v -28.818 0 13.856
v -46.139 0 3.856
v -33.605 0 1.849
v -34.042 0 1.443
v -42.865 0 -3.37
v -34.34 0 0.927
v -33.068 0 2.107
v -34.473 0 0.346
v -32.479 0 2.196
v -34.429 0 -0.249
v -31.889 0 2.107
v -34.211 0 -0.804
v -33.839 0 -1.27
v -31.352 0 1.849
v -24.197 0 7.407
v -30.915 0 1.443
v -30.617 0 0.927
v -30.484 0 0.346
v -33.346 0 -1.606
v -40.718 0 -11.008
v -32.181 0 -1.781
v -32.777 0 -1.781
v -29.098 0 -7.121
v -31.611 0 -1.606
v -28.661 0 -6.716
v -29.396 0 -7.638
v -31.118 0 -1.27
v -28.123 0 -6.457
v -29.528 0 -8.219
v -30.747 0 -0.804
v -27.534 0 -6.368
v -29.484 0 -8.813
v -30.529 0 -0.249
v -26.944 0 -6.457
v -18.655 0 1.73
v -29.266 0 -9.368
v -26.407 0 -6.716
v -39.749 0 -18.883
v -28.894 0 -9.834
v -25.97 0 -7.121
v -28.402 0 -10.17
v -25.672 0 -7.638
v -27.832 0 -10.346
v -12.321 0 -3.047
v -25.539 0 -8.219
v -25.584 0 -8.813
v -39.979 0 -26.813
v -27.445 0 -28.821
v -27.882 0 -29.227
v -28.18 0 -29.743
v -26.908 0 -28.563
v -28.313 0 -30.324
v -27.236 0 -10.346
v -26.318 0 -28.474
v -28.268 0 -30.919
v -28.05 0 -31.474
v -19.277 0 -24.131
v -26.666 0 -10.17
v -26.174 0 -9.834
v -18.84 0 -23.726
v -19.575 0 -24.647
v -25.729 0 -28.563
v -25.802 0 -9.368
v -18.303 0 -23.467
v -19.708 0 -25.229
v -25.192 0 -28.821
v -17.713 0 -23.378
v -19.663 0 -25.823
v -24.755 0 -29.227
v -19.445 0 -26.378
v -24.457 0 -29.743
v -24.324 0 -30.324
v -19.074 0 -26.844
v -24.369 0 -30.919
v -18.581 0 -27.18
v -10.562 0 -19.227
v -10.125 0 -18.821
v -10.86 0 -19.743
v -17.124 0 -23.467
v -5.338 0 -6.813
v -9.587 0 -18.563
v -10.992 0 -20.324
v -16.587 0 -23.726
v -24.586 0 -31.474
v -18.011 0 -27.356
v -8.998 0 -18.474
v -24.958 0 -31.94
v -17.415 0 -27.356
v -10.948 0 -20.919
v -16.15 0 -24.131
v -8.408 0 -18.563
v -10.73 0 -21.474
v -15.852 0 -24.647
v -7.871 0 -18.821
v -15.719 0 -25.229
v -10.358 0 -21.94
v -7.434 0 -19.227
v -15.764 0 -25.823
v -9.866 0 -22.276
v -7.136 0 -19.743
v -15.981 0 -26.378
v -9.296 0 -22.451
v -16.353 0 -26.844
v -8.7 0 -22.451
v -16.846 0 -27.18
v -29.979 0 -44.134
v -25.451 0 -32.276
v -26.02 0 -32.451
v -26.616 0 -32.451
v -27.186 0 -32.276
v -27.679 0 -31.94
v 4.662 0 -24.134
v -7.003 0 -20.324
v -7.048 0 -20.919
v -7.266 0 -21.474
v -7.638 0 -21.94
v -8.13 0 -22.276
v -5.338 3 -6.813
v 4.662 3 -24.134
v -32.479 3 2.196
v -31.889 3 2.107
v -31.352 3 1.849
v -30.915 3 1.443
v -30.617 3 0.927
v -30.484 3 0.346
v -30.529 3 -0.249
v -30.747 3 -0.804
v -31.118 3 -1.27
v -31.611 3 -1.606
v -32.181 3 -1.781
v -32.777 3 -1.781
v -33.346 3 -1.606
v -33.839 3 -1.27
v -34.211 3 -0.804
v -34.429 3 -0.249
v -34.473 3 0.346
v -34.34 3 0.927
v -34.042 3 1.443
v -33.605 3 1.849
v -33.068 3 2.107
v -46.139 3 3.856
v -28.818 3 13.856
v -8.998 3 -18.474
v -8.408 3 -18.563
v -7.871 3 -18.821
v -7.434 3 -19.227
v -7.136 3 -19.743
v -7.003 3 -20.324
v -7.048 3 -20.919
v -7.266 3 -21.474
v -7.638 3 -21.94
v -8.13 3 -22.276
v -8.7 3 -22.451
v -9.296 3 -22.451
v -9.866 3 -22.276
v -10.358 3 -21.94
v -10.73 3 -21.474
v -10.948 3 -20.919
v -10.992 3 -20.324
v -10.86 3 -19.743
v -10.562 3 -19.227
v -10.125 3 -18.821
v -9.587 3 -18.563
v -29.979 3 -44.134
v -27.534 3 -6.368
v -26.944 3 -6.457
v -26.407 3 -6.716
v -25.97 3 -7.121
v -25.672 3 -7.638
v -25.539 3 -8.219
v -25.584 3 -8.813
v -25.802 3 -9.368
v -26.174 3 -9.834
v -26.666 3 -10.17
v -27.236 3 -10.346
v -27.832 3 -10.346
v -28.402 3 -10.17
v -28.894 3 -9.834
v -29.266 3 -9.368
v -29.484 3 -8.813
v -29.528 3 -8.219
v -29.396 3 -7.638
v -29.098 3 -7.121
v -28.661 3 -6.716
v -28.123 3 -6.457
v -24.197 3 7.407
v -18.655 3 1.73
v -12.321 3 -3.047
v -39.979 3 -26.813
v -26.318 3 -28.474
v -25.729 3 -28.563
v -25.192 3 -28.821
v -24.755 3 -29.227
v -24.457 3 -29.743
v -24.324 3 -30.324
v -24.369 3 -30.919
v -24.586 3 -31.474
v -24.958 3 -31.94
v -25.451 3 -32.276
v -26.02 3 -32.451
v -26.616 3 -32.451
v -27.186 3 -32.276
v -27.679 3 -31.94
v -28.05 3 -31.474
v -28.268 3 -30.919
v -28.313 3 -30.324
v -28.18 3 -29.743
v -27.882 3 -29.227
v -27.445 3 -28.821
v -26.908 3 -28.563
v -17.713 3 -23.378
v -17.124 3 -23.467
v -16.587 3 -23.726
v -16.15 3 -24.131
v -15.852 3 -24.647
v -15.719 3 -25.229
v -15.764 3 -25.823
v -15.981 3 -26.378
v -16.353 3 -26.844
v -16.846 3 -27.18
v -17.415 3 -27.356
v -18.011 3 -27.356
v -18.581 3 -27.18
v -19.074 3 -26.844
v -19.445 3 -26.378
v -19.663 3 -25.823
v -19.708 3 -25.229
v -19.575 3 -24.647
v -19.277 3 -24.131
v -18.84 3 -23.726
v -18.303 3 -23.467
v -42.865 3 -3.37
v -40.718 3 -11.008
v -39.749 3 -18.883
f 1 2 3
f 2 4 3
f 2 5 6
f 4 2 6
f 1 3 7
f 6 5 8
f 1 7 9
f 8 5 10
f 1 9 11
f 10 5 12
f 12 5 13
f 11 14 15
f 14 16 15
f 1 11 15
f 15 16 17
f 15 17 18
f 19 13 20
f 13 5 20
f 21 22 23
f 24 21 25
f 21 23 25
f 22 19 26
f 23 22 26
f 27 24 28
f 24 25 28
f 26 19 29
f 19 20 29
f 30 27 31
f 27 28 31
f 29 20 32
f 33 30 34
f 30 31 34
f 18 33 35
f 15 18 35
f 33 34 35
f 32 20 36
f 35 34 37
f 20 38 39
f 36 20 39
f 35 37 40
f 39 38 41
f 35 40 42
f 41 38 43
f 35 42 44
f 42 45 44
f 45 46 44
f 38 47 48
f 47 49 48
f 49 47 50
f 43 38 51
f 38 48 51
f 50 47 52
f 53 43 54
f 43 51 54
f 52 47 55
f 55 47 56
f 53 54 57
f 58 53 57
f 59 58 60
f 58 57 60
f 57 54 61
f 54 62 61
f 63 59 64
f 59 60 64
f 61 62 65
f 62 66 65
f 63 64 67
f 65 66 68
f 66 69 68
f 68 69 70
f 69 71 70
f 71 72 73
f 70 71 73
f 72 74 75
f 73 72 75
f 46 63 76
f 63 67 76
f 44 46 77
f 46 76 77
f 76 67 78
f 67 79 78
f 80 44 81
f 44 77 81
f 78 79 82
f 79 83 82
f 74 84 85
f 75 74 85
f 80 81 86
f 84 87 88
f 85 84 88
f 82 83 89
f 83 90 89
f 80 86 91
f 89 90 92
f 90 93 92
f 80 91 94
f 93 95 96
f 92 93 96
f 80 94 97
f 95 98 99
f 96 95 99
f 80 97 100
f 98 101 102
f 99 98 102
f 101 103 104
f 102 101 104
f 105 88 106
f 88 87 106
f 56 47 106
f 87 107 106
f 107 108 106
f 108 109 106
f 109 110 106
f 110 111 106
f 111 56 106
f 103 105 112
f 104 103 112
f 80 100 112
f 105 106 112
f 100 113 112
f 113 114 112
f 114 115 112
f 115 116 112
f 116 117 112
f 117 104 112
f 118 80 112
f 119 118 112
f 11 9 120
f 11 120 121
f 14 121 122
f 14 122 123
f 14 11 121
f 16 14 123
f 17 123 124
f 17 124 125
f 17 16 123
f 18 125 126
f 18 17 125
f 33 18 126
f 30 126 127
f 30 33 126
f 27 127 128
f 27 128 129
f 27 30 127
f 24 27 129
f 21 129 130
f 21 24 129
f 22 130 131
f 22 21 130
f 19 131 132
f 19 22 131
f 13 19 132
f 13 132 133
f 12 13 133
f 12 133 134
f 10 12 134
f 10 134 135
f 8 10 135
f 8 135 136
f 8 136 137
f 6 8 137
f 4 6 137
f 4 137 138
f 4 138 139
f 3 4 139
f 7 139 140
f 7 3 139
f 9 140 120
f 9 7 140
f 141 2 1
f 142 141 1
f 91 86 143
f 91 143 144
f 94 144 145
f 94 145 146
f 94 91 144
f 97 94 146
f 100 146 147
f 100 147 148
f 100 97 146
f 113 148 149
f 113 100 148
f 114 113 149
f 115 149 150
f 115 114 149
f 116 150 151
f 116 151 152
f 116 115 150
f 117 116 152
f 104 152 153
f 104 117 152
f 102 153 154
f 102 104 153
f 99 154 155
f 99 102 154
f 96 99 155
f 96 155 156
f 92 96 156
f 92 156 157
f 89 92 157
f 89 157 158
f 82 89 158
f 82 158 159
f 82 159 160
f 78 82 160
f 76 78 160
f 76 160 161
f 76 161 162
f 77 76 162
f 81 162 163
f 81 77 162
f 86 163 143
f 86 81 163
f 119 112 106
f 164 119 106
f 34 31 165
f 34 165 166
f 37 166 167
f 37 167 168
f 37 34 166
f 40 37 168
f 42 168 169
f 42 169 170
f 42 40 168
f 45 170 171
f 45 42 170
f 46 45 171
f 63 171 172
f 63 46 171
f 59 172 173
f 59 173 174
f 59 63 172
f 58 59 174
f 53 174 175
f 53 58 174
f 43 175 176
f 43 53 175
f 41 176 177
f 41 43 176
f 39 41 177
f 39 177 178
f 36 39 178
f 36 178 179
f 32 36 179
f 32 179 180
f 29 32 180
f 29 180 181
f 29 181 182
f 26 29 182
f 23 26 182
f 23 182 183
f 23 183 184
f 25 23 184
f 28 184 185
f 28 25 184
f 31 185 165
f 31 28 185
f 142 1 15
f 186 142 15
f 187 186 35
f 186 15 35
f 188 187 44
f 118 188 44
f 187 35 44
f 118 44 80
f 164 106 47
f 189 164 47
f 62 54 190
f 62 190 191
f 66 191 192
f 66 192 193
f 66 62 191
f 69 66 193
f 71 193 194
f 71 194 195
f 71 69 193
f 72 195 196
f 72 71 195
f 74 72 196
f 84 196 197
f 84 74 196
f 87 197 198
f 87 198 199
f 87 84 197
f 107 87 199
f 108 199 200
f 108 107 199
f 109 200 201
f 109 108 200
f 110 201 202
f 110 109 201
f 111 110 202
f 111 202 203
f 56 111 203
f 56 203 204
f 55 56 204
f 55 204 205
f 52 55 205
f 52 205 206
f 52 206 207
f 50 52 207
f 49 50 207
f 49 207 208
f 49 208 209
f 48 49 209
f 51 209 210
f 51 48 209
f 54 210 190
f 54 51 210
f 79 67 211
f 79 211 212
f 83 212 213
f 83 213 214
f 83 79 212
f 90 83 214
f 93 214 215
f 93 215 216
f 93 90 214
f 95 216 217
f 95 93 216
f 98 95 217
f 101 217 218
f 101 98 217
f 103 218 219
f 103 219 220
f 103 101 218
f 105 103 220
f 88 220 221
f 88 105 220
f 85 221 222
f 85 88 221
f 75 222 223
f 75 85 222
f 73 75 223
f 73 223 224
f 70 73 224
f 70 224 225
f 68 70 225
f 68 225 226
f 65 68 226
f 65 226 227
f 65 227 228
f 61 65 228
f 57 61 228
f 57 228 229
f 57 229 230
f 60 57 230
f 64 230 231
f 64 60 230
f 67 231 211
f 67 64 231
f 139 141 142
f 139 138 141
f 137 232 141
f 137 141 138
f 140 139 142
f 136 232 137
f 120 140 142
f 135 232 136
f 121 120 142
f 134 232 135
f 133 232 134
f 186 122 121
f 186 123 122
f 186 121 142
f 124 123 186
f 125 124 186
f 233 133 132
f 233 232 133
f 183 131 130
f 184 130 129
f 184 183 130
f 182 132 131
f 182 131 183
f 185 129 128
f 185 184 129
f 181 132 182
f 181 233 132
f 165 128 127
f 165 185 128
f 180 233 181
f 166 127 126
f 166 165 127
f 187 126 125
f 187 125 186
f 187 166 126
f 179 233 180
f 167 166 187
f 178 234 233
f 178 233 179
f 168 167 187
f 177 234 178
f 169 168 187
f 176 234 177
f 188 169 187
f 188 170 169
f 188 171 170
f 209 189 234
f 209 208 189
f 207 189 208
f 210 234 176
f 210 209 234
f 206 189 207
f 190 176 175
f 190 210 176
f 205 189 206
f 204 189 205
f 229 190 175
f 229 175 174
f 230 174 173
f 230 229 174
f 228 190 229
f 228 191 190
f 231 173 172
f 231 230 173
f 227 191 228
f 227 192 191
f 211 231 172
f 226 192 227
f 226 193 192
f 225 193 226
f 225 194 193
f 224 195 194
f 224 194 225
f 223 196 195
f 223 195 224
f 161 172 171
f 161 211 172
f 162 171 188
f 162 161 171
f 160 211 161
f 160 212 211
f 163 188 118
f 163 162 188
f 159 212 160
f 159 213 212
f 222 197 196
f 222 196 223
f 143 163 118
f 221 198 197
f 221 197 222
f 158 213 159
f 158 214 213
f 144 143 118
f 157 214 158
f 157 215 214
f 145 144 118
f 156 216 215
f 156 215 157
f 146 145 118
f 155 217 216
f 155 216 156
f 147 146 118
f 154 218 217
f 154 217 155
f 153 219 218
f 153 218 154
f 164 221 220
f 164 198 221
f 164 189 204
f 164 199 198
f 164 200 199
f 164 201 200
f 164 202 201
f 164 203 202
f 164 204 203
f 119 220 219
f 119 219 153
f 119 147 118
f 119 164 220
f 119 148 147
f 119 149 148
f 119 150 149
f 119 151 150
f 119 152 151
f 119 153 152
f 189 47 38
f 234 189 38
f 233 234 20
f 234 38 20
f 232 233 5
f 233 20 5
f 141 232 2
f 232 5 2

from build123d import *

# Parameters (mm, degrees)
SKETCH_1_R      = 2
EXTRUDE_1_DEPTH = 3


with BuildPart() as part:
    # 草图1 → 凸台-拉伸1 (new body)
    with BuildSketch(Plane(origin=(0, 0, 0), x_dir=(1, 0, 0), z_dir=(0, 1, 0))):
        with BuildLine():
            Line((-5.337642525, 6.81342157), (4.662357475, 24.133929646))
            Line((4.662357475, 24.133929646), (-29.978658676, 44.133929646))
            Line((-29.978658676, 44.133929646), (-39.978658676, 26.81342157))
            ThreePointArc((-39.978658676, 26.81342157), (-40.718178371, 11.008358068), (-46.138912714, -3.856451411))
            Line((-46.138912714, -3.856451411), (-28.818404638, -13.856451411))
            ThreePointArc((-28.818404638, -13.856451411), (-18.655469178, -1.729553023), (-5.337642525, 6.81342157))
        make_face()
        with Locations(Location((-26.318404638, 30.473675608, 0), (0, 0, 270))):
            Circle(SKETCH_1_R, mode=Mode.SUBTRACT)
        with Locations(Location((-17.713393416, 25.377992244, 0), (0, 0, 270))):
            Circle(SKETCH_1_R, mode=Mode.SUBTRACT)
        with Locations(Location((-8.997896563, 20.473675608, 0), (0, 0, 270))):
            Circle(SKETCH_1_R, mode=Mode.SUBTRACT)
        with Locations(Location((-27.533901492, 8.368373301, 0), (0, 0, 270))):
            Circle(SKETCH_1_R, mode=Mode.SUBTRACT)
        with Locations(Location((-32.478658676, -0.196197373, 0), (0, 0, 270))):
            Circle(SKETCH_1_R, mode=Mode.SUBTRACT)
    extrude(amount=EXTRUDE_1_DEPTH)


solid = part.part
